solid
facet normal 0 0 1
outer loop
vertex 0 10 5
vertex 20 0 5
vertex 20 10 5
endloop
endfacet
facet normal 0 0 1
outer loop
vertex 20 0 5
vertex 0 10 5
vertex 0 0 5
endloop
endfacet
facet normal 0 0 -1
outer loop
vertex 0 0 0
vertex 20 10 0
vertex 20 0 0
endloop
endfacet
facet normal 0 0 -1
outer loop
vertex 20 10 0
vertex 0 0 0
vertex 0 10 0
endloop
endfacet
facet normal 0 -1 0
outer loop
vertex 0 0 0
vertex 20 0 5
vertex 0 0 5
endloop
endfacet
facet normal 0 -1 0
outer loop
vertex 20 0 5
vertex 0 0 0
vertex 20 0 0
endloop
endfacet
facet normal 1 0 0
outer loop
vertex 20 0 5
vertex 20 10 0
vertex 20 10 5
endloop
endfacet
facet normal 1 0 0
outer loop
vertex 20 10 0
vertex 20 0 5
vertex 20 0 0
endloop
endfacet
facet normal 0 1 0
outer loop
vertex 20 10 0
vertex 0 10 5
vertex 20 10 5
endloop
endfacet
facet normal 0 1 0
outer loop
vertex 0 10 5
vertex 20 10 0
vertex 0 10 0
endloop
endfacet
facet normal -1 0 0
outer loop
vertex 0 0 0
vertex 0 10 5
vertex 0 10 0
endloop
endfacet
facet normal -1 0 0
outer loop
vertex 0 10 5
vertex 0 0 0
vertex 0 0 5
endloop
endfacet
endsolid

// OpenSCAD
// file: include-lib.scad
// include-lib.scad — the file include-main.scad pulls in. Editing it must
// reload / re-evaluate include-main.scad (include tracking + conversion cache).
plate_w = 20;
module plate() { cube([plate_w, 10, 5]); }
// main file
// include-main.scad — a two-file model: the geometry comes from
// include-lib.scad. With plate_w = 20 the plate is 20 x 10 x 5 = 1000 mm3;
// changing plate_w in the library to 40 makes it 2000 mm3. Used to prove that
// an edited include is never served from a stale conversion cache.
include <include-lib.scad>
plate();
